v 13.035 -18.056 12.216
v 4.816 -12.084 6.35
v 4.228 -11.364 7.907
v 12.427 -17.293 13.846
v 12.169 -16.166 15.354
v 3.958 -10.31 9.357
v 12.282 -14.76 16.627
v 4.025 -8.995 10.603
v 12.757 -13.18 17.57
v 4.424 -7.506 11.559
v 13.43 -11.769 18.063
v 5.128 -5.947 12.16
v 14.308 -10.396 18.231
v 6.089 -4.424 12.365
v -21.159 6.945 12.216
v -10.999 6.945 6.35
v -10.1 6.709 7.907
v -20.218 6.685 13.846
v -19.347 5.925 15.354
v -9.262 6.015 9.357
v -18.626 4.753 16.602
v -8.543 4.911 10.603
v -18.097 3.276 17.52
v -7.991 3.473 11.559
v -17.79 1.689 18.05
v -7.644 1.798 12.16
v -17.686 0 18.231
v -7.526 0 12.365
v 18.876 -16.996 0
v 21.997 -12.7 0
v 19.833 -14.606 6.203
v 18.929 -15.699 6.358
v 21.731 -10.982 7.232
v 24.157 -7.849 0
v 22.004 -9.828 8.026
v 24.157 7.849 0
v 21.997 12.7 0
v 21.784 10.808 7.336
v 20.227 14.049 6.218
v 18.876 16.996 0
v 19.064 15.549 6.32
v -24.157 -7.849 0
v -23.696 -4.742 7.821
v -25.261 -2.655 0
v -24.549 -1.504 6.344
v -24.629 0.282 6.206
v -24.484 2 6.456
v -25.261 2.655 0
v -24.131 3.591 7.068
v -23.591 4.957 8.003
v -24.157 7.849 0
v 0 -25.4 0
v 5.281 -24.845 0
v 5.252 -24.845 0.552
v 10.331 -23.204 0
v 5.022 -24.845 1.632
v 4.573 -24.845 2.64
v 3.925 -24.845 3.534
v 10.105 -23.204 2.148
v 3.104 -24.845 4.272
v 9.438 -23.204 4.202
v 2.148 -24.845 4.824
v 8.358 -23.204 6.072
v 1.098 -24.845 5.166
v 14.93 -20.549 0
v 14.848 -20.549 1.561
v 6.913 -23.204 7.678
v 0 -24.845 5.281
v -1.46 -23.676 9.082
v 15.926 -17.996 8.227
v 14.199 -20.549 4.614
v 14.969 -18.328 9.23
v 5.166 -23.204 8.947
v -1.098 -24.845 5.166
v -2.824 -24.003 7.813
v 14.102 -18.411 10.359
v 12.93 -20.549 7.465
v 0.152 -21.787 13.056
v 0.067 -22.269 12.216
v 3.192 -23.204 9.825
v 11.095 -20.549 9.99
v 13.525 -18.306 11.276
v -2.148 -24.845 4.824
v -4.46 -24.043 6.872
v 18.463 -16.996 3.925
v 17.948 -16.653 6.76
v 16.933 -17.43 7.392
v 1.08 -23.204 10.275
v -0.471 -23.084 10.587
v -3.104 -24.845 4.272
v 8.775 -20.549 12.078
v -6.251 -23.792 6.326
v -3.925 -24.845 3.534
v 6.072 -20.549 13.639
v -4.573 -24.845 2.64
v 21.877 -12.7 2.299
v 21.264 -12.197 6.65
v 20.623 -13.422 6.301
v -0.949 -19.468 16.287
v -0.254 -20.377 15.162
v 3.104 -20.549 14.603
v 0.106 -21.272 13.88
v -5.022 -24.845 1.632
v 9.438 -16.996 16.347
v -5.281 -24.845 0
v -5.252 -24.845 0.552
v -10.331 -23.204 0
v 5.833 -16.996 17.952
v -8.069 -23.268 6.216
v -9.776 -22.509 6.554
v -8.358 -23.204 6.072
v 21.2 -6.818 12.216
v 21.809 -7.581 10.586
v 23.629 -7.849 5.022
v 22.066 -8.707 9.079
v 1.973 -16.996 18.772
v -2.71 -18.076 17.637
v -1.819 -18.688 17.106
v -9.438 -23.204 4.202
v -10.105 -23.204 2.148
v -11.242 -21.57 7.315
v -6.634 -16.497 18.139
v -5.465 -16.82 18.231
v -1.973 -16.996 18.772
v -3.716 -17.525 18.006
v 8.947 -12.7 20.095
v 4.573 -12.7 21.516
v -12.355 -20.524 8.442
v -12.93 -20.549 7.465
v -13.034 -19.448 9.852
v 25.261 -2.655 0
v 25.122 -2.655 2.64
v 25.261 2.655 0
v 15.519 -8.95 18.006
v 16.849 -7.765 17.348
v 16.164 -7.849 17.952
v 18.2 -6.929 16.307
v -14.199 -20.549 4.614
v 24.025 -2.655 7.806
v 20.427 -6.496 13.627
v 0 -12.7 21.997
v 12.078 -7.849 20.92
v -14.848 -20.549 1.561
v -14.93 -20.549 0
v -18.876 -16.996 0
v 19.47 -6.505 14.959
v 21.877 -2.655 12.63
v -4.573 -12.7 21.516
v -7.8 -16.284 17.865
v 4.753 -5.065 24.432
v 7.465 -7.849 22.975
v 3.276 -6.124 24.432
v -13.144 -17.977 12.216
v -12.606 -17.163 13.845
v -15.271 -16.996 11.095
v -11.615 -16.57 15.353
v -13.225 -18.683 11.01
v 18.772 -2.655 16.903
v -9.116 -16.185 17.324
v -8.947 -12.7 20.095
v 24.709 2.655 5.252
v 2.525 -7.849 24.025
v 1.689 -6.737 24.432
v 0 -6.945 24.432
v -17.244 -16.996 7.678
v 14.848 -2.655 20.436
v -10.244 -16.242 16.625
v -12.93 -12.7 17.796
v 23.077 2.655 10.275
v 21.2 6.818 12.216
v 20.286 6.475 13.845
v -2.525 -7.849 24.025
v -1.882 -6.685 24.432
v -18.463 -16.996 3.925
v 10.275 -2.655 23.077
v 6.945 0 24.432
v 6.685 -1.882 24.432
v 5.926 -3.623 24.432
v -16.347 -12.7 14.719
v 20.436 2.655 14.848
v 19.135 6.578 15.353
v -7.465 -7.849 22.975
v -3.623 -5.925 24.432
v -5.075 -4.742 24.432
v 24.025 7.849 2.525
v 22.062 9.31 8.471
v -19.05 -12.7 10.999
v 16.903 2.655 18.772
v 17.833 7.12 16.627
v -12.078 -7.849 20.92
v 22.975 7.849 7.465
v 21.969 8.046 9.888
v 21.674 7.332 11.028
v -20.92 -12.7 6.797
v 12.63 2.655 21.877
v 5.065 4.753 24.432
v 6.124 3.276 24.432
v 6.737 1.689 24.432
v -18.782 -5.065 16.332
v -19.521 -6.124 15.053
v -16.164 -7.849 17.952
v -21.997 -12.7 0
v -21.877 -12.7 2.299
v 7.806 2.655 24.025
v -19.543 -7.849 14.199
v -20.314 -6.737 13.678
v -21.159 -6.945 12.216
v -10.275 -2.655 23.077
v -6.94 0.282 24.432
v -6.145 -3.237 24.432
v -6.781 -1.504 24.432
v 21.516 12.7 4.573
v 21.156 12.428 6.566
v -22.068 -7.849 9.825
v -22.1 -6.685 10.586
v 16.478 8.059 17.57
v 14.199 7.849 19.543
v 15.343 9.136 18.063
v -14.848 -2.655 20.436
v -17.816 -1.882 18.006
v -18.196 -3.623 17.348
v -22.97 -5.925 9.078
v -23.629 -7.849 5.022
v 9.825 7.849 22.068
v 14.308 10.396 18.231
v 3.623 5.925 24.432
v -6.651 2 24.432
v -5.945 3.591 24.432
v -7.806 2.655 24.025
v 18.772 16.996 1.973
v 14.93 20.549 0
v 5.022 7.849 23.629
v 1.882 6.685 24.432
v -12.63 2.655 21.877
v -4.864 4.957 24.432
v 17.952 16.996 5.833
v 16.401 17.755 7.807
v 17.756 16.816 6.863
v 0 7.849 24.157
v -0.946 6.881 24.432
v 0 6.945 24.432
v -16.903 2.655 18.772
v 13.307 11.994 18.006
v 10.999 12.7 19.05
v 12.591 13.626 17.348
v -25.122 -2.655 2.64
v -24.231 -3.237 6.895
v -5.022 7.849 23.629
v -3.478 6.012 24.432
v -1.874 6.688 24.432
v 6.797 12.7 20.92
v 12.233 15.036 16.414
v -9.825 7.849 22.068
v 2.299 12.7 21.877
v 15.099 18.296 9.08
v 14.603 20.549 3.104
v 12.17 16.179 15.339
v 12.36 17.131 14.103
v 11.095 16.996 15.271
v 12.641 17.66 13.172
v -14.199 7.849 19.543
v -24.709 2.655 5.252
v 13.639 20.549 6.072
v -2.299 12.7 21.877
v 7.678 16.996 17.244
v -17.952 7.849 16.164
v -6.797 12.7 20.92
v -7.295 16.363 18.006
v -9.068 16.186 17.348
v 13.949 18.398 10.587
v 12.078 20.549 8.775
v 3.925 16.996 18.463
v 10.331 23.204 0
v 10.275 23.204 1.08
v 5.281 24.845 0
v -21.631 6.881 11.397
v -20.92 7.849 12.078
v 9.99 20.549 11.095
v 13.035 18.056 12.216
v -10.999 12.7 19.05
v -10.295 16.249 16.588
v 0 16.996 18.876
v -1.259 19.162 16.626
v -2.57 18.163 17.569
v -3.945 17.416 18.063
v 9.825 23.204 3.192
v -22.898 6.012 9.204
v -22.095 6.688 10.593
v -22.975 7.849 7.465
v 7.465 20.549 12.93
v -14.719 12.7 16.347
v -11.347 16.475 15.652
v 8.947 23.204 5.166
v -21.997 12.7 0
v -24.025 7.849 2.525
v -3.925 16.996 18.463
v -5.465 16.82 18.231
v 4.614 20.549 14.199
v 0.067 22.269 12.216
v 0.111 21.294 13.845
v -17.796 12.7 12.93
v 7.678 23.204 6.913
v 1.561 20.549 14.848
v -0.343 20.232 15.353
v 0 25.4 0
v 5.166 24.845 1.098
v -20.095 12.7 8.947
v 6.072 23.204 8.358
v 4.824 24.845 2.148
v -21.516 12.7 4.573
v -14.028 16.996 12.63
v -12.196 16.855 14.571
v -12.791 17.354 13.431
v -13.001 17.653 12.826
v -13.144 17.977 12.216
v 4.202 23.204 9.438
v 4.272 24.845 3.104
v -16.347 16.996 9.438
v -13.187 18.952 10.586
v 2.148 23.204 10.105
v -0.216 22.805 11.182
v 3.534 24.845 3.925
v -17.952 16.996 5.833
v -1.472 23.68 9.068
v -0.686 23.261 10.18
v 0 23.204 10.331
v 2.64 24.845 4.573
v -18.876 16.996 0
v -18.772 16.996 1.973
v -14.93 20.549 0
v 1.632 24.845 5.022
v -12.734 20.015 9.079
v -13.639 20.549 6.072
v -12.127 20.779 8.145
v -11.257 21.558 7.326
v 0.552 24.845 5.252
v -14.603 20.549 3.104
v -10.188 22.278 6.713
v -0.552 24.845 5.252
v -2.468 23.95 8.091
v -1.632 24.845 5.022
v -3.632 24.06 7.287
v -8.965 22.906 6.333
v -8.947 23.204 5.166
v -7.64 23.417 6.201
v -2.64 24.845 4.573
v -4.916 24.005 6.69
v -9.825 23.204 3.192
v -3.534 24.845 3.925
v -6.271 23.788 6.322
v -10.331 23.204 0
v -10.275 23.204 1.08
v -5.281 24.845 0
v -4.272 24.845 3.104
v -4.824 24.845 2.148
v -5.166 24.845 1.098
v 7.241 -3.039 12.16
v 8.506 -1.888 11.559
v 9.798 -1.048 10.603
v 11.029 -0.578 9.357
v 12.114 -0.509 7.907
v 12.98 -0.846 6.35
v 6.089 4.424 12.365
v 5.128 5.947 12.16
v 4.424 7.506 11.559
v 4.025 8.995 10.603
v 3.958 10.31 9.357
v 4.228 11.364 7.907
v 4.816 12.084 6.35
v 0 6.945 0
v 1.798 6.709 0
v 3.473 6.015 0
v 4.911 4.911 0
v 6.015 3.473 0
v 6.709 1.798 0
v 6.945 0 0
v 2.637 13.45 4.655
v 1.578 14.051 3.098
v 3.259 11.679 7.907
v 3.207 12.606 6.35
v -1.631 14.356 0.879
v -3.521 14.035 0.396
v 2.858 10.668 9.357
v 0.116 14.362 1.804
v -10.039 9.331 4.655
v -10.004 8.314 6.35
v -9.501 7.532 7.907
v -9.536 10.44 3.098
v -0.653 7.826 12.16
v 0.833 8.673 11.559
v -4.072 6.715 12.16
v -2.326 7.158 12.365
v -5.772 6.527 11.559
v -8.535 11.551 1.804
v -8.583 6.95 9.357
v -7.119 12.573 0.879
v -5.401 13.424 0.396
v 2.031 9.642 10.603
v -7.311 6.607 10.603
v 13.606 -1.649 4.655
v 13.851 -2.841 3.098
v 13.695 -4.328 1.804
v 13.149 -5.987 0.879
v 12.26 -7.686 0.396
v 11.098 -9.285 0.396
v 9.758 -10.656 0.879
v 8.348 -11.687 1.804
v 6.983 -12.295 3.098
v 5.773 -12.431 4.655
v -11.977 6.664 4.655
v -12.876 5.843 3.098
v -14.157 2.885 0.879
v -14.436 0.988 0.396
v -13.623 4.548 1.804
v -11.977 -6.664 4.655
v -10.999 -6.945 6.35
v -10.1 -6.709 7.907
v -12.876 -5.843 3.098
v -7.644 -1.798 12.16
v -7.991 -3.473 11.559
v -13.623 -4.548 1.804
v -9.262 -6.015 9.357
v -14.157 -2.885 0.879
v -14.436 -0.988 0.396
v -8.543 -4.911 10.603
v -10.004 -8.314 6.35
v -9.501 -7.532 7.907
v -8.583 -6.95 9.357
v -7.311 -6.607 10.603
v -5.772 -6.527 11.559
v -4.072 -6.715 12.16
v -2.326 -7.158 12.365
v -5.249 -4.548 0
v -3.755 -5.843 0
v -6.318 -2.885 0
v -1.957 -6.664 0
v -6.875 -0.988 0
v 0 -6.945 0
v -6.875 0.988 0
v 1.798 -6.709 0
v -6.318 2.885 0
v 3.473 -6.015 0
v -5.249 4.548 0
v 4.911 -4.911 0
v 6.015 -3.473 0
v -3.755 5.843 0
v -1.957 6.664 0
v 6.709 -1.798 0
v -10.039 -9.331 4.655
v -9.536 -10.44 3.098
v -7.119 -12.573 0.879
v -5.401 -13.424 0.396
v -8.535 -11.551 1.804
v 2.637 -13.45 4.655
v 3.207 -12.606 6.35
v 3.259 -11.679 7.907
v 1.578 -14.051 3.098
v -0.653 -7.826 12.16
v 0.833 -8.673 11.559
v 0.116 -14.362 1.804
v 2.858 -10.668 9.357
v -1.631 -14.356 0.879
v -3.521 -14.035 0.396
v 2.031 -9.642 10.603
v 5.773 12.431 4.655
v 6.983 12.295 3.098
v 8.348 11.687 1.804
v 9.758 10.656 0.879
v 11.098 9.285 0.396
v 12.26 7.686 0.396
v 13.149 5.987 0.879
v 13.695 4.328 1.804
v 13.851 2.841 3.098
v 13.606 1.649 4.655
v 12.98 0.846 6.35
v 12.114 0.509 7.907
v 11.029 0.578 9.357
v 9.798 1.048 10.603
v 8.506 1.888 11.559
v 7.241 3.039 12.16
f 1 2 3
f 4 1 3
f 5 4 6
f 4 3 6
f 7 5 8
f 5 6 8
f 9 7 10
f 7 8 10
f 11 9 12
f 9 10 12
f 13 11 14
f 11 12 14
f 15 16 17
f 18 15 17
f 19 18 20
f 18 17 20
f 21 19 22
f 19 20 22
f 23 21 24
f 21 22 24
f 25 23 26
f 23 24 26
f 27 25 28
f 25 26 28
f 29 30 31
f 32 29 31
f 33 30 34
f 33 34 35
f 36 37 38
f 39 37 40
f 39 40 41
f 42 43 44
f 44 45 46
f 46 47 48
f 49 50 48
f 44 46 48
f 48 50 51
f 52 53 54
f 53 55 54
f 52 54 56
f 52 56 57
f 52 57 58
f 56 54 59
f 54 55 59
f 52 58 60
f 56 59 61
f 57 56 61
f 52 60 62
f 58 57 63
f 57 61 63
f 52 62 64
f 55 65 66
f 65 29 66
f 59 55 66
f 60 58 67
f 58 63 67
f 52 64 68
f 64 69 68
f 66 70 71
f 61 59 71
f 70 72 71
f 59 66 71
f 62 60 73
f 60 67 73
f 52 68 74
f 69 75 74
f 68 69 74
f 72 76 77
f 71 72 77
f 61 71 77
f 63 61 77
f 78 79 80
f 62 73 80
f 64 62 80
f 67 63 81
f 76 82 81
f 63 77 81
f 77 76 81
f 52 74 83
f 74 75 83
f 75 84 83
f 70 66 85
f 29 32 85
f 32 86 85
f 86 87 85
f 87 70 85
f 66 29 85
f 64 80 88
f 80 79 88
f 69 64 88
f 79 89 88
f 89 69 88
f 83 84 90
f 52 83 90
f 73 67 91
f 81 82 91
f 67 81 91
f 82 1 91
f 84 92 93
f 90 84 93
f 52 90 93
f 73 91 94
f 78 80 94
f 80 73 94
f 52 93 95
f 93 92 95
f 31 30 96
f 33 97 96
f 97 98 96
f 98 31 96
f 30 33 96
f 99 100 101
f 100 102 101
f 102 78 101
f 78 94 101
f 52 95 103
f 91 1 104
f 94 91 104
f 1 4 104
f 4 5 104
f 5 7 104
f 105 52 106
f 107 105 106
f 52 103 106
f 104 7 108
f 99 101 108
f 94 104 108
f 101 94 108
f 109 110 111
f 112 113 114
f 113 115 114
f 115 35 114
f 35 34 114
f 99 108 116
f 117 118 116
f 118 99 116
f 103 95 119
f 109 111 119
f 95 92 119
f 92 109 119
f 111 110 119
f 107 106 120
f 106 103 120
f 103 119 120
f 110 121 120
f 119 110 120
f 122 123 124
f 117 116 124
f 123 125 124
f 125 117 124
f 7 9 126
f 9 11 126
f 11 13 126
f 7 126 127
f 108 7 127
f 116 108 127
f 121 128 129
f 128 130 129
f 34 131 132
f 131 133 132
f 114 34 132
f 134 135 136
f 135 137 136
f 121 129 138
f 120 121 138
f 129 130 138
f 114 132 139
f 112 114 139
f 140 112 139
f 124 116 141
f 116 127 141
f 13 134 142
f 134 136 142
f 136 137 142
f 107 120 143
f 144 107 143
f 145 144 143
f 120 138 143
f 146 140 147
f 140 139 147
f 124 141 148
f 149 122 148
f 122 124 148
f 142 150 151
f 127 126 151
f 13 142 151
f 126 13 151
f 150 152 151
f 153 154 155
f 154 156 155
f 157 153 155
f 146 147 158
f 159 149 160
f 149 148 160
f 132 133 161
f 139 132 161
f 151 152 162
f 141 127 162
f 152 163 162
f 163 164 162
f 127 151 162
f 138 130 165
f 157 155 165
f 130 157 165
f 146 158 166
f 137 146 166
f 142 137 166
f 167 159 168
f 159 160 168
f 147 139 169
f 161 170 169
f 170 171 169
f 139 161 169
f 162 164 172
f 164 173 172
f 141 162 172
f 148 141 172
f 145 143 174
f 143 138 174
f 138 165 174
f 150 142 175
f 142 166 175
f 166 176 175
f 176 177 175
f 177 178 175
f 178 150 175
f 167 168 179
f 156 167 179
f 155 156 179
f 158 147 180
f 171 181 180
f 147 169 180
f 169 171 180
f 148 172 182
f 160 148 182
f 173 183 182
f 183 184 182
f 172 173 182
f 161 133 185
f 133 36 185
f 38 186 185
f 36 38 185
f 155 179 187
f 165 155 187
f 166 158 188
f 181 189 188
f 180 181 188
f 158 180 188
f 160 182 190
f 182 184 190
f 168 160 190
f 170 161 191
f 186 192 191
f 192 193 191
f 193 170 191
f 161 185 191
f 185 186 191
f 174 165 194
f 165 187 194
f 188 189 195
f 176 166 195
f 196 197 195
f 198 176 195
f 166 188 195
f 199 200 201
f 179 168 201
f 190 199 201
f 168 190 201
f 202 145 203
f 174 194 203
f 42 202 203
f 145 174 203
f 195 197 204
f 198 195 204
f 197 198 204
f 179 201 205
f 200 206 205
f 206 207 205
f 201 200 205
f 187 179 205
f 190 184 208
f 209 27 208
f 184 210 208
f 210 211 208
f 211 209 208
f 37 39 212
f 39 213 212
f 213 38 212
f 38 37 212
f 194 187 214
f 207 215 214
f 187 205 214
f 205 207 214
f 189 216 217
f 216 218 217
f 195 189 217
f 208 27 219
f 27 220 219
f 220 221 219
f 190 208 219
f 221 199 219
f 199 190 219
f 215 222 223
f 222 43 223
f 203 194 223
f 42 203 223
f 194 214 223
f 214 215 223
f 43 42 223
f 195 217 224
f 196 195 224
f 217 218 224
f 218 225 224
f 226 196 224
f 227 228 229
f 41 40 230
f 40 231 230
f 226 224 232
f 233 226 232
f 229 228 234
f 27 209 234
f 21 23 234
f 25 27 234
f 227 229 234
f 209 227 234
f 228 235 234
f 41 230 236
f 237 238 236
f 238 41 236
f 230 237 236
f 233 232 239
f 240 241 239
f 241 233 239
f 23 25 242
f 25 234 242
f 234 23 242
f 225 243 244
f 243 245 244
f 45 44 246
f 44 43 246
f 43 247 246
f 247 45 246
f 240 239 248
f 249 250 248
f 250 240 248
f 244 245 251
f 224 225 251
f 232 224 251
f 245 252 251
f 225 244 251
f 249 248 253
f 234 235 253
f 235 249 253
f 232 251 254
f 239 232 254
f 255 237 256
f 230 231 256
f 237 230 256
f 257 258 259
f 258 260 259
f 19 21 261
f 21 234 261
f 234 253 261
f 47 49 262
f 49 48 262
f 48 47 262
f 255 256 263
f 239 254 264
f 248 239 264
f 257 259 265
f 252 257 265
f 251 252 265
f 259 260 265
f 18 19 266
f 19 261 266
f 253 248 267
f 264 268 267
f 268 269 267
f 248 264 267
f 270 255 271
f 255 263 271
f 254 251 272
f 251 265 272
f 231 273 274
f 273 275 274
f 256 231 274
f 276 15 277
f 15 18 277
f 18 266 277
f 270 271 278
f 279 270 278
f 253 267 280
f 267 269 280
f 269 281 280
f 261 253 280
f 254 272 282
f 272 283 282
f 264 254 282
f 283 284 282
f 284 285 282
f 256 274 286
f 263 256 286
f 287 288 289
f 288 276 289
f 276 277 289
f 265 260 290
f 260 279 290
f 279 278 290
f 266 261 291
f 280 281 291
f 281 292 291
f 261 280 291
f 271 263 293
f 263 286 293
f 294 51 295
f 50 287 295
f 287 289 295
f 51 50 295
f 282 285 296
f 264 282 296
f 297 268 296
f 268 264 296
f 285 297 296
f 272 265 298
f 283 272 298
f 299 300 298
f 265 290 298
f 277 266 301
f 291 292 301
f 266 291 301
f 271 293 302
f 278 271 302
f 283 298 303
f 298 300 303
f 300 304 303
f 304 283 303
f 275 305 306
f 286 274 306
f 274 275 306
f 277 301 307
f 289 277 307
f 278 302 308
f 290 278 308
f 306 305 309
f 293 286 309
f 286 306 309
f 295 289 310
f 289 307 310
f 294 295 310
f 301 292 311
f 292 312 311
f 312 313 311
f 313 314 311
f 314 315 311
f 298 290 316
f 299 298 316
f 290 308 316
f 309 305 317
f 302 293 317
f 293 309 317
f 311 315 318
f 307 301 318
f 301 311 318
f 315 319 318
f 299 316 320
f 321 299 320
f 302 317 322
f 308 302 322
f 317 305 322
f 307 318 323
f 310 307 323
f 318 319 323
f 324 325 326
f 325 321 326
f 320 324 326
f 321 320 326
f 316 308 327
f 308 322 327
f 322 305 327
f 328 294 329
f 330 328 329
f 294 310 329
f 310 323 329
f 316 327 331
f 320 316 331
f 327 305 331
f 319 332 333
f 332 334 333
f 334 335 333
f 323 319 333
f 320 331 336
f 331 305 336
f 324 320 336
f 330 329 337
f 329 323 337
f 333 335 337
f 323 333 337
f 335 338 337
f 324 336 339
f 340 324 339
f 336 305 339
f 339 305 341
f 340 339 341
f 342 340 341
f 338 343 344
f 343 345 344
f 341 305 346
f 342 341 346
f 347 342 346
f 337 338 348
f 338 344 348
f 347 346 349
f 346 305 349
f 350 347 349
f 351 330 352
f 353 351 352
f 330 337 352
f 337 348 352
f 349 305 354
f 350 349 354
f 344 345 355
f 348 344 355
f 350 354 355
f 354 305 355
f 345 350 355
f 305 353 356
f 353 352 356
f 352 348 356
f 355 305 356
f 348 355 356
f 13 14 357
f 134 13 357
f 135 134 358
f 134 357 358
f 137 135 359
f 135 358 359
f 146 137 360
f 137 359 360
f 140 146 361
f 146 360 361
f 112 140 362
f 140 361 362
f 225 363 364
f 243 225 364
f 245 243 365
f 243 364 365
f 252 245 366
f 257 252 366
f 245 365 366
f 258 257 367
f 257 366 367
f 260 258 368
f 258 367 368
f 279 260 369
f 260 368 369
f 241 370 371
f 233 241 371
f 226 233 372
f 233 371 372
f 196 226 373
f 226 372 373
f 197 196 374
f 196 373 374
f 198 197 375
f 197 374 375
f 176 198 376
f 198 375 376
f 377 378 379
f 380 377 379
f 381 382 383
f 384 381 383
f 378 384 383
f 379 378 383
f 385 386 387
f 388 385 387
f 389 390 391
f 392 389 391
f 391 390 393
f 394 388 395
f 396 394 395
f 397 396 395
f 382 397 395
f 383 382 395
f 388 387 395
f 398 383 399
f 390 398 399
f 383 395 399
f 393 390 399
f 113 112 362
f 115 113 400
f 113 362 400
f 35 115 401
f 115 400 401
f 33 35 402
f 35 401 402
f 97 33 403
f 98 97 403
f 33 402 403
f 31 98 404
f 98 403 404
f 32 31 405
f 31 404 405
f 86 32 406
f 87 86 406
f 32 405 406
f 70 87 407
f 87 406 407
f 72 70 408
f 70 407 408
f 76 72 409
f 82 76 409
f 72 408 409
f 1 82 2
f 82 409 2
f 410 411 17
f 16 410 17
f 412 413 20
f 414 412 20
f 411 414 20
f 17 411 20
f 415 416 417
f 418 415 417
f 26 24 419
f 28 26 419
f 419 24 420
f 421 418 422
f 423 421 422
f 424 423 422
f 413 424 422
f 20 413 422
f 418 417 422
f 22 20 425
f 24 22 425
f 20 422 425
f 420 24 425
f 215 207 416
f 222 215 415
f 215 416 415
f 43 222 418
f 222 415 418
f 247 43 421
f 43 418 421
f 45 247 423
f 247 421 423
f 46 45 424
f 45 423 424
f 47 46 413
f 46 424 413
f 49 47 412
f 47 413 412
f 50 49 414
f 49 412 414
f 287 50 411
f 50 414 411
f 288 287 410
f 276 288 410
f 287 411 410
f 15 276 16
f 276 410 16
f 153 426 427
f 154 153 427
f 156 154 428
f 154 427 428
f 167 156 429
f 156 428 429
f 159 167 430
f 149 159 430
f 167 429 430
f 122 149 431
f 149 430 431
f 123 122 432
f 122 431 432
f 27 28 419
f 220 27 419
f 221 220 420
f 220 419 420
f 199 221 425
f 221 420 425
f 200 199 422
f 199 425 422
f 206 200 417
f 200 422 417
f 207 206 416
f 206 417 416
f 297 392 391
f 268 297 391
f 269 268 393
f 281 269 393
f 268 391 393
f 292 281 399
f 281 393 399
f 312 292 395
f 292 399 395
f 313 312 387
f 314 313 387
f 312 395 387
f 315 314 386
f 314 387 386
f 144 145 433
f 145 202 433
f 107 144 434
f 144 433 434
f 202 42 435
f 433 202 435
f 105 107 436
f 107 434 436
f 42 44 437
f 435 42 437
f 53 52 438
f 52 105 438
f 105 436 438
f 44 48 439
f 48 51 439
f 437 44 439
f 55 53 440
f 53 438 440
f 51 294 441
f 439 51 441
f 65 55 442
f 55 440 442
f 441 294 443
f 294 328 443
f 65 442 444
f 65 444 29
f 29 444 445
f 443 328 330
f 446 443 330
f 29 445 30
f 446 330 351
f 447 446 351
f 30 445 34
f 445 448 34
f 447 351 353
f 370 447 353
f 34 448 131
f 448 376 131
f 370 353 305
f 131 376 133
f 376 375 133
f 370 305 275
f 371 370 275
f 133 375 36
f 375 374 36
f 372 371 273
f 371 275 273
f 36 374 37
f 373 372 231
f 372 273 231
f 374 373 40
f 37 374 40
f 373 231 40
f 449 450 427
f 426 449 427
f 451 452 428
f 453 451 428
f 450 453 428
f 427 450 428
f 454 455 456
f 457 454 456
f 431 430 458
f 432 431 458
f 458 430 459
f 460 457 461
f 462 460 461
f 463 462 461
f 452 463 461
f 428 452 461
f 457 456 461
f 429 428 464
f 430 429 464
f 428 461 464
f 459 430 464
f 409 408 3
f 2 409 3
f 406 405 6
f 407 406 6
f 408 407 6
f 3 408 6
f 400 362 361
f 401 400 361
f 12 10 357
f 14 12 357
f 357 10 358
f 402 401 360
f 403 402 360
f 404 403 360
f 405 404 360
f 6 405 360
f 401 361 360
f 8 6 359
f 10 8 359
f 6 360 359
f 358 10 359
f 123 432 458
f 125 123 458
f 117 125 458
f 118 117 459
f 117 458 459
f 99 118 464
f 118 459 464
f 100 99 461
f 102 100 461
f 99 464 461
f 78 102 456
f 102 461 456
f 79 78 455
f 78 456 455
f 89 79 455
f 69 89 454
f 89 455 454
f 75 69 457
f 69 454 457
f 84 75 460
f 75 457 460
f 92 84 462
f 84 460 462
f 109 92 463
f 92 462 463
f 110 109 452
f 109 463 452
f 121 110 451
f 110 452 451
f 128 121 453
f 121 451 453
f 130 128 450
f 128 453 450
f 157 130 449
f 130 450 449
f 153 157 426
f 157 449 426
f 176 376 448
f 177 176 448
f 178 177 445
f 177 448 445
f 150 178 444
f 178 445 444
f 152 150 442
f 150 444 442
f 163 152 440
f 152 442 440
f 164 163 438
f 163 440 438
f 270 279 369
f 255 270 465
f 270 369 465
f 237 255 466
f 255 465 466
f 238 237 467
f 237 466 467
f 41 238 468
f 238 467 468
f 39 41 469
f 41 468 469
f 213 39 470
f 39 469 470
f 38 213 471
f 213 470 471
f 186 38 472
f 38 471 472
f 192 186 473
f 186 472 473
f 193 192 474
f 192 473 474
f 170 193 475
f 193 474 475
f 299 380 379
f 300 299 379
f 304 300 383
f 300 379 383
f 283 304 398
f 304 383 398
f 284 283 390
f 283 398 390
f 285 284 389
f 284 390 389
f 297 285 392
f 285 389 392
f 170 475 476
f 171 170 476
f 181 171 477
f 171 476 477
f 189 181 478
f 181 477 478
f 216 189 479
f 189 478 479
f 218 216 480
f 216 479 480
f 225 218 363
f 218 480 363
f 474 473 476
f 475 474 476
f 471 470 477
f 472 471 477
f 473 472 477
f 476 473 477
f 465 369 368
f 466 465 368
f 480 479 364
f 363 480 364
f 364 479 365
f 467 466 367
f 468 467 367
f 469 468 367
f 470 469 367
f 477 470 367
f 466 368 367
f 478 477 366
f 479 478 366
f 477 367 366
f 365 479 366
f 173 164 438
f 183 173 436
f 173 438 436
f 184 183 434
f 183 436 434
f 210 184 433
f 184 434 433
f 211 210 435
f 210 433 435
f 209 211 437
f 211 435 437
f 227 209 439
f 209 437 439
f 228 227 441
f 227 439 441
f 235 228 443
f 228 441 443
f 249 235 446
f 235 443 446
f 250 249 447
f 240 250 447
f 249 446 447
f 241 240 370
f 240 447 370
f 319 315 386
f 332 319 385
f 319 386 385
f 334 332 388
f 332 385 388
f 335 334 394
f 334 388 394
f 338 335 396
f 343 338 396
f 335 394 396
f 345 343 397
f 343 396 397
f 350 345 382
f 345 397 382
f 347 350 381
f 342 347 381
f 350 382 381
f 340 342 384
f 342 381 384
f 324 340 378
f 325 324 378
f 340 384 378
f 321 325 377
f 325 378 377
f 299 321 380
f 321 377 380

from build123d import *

# Parameters (mm, degrees)
F1_ANGLE = 180
F3_DEPTH = 38.1
F4_ANGLE = 60
F8_COUNT = 5


with BuildPart() as f1:
    # F0 (on Top) → F1 (revolve)
    with BuildSketch(Plane.XY):
        with BuildLine():
            Line((0, 0), (0, -25.4))
            ThreePointArc((0, -25.4), (25.4, 0), (0, 25.4))
            Line((0, 25.4), (0, 0))
        make_face()
    revolve(axis=Axis((0, -19.9486762285, 0), (0, -1, 0)), revolution_arc=F1_ANGLE)


with BuildPart() as f3:
    # F2 (on face) → F3 (new body)
    with BuildSketch(Plane(origin=(0, 0, 0), x_dir=(1, 0, 0), z_dir=(0, 0, -1))):
        with BuildLine():
            Line((0, -6.9453125), (0, 6.9453125))
            ThreePointArc((0, 6.9453125), (-6.9453125, 0), (0, -6.9453125))
        make_face()
        with BuildLine():
            ThreePointArc((0, -6.9453125), (4.9110775662, -4.9110775662), (6.9453125, 0))
            ThreePointArc((6.9453125, 0), (4.9110775662, 4.9110775662), (0, 6.9453125))
            Line((0, 6.9453125), (0, -6.9453125))
        make_face()
    extrude(amount=-F3_DEPTH)


with BuildPart() as f4_1:
    # F4: copy of F3
    add(f3.part.rotate(Axis((0, 0.6129407927, 0), (0, -1, 0)), F4_ANGLE))


with BuildPart() as f4_1_1:
    # F7: moved
    add(f4_1.part.moved(Location((-10.9985226281, 0, 6.35))))


with BuildPart() as f8_1:
    # F8: instance of F4_1
    add(f4_1_1.part.rotate(Axis((0, 0, 10.6922788545), (0, 0, -1)), 1 * 360 / F8_COUNT))


with BuildPart() as f8_2:
    # F8: instance of F4_1
    add(f4_1_1.part.rotate(Axis((0, 0, 10.6922788545), (0, 0, -1)), 2 * 360 / F8_COUNT))


with BuildPart() as f8_3:
    # F8: instance of F4_1
    add(f4_1_1.part.rotate(Axis((0, 0, 10.6922788545), (0, 0, -1)), 3 * 360 / F8_COUNT))


with BuildPart() as f8_4:
    # F8: instance of F4_1
    add(f4_1_1.part.rotate(Axis((0, 0, 10.6922788545), (0, 0, -1)), 4 * 360 / F8_COUNT))


with BuildPart() as f1_1:
    add(f1.part)

    # F9: cut F8_1, F8_2, F8_3, F8_4, F4_1, F3
    add(f8_1.part, mode=Mode.SUBTRACT)
    add(f8_2.part, mode=Mode.SUBTRACT)
    add(f8_3.part, mode=Mode.SUBTRACT)
    add(f8_4.part, mode=Mode.SUBTRACT)
    add(f4_1_1.part, mode=Mode.SUBTRACT)
    add(f3.part, mode=Mode.SUBTRACT)


solid = f1_1.part
